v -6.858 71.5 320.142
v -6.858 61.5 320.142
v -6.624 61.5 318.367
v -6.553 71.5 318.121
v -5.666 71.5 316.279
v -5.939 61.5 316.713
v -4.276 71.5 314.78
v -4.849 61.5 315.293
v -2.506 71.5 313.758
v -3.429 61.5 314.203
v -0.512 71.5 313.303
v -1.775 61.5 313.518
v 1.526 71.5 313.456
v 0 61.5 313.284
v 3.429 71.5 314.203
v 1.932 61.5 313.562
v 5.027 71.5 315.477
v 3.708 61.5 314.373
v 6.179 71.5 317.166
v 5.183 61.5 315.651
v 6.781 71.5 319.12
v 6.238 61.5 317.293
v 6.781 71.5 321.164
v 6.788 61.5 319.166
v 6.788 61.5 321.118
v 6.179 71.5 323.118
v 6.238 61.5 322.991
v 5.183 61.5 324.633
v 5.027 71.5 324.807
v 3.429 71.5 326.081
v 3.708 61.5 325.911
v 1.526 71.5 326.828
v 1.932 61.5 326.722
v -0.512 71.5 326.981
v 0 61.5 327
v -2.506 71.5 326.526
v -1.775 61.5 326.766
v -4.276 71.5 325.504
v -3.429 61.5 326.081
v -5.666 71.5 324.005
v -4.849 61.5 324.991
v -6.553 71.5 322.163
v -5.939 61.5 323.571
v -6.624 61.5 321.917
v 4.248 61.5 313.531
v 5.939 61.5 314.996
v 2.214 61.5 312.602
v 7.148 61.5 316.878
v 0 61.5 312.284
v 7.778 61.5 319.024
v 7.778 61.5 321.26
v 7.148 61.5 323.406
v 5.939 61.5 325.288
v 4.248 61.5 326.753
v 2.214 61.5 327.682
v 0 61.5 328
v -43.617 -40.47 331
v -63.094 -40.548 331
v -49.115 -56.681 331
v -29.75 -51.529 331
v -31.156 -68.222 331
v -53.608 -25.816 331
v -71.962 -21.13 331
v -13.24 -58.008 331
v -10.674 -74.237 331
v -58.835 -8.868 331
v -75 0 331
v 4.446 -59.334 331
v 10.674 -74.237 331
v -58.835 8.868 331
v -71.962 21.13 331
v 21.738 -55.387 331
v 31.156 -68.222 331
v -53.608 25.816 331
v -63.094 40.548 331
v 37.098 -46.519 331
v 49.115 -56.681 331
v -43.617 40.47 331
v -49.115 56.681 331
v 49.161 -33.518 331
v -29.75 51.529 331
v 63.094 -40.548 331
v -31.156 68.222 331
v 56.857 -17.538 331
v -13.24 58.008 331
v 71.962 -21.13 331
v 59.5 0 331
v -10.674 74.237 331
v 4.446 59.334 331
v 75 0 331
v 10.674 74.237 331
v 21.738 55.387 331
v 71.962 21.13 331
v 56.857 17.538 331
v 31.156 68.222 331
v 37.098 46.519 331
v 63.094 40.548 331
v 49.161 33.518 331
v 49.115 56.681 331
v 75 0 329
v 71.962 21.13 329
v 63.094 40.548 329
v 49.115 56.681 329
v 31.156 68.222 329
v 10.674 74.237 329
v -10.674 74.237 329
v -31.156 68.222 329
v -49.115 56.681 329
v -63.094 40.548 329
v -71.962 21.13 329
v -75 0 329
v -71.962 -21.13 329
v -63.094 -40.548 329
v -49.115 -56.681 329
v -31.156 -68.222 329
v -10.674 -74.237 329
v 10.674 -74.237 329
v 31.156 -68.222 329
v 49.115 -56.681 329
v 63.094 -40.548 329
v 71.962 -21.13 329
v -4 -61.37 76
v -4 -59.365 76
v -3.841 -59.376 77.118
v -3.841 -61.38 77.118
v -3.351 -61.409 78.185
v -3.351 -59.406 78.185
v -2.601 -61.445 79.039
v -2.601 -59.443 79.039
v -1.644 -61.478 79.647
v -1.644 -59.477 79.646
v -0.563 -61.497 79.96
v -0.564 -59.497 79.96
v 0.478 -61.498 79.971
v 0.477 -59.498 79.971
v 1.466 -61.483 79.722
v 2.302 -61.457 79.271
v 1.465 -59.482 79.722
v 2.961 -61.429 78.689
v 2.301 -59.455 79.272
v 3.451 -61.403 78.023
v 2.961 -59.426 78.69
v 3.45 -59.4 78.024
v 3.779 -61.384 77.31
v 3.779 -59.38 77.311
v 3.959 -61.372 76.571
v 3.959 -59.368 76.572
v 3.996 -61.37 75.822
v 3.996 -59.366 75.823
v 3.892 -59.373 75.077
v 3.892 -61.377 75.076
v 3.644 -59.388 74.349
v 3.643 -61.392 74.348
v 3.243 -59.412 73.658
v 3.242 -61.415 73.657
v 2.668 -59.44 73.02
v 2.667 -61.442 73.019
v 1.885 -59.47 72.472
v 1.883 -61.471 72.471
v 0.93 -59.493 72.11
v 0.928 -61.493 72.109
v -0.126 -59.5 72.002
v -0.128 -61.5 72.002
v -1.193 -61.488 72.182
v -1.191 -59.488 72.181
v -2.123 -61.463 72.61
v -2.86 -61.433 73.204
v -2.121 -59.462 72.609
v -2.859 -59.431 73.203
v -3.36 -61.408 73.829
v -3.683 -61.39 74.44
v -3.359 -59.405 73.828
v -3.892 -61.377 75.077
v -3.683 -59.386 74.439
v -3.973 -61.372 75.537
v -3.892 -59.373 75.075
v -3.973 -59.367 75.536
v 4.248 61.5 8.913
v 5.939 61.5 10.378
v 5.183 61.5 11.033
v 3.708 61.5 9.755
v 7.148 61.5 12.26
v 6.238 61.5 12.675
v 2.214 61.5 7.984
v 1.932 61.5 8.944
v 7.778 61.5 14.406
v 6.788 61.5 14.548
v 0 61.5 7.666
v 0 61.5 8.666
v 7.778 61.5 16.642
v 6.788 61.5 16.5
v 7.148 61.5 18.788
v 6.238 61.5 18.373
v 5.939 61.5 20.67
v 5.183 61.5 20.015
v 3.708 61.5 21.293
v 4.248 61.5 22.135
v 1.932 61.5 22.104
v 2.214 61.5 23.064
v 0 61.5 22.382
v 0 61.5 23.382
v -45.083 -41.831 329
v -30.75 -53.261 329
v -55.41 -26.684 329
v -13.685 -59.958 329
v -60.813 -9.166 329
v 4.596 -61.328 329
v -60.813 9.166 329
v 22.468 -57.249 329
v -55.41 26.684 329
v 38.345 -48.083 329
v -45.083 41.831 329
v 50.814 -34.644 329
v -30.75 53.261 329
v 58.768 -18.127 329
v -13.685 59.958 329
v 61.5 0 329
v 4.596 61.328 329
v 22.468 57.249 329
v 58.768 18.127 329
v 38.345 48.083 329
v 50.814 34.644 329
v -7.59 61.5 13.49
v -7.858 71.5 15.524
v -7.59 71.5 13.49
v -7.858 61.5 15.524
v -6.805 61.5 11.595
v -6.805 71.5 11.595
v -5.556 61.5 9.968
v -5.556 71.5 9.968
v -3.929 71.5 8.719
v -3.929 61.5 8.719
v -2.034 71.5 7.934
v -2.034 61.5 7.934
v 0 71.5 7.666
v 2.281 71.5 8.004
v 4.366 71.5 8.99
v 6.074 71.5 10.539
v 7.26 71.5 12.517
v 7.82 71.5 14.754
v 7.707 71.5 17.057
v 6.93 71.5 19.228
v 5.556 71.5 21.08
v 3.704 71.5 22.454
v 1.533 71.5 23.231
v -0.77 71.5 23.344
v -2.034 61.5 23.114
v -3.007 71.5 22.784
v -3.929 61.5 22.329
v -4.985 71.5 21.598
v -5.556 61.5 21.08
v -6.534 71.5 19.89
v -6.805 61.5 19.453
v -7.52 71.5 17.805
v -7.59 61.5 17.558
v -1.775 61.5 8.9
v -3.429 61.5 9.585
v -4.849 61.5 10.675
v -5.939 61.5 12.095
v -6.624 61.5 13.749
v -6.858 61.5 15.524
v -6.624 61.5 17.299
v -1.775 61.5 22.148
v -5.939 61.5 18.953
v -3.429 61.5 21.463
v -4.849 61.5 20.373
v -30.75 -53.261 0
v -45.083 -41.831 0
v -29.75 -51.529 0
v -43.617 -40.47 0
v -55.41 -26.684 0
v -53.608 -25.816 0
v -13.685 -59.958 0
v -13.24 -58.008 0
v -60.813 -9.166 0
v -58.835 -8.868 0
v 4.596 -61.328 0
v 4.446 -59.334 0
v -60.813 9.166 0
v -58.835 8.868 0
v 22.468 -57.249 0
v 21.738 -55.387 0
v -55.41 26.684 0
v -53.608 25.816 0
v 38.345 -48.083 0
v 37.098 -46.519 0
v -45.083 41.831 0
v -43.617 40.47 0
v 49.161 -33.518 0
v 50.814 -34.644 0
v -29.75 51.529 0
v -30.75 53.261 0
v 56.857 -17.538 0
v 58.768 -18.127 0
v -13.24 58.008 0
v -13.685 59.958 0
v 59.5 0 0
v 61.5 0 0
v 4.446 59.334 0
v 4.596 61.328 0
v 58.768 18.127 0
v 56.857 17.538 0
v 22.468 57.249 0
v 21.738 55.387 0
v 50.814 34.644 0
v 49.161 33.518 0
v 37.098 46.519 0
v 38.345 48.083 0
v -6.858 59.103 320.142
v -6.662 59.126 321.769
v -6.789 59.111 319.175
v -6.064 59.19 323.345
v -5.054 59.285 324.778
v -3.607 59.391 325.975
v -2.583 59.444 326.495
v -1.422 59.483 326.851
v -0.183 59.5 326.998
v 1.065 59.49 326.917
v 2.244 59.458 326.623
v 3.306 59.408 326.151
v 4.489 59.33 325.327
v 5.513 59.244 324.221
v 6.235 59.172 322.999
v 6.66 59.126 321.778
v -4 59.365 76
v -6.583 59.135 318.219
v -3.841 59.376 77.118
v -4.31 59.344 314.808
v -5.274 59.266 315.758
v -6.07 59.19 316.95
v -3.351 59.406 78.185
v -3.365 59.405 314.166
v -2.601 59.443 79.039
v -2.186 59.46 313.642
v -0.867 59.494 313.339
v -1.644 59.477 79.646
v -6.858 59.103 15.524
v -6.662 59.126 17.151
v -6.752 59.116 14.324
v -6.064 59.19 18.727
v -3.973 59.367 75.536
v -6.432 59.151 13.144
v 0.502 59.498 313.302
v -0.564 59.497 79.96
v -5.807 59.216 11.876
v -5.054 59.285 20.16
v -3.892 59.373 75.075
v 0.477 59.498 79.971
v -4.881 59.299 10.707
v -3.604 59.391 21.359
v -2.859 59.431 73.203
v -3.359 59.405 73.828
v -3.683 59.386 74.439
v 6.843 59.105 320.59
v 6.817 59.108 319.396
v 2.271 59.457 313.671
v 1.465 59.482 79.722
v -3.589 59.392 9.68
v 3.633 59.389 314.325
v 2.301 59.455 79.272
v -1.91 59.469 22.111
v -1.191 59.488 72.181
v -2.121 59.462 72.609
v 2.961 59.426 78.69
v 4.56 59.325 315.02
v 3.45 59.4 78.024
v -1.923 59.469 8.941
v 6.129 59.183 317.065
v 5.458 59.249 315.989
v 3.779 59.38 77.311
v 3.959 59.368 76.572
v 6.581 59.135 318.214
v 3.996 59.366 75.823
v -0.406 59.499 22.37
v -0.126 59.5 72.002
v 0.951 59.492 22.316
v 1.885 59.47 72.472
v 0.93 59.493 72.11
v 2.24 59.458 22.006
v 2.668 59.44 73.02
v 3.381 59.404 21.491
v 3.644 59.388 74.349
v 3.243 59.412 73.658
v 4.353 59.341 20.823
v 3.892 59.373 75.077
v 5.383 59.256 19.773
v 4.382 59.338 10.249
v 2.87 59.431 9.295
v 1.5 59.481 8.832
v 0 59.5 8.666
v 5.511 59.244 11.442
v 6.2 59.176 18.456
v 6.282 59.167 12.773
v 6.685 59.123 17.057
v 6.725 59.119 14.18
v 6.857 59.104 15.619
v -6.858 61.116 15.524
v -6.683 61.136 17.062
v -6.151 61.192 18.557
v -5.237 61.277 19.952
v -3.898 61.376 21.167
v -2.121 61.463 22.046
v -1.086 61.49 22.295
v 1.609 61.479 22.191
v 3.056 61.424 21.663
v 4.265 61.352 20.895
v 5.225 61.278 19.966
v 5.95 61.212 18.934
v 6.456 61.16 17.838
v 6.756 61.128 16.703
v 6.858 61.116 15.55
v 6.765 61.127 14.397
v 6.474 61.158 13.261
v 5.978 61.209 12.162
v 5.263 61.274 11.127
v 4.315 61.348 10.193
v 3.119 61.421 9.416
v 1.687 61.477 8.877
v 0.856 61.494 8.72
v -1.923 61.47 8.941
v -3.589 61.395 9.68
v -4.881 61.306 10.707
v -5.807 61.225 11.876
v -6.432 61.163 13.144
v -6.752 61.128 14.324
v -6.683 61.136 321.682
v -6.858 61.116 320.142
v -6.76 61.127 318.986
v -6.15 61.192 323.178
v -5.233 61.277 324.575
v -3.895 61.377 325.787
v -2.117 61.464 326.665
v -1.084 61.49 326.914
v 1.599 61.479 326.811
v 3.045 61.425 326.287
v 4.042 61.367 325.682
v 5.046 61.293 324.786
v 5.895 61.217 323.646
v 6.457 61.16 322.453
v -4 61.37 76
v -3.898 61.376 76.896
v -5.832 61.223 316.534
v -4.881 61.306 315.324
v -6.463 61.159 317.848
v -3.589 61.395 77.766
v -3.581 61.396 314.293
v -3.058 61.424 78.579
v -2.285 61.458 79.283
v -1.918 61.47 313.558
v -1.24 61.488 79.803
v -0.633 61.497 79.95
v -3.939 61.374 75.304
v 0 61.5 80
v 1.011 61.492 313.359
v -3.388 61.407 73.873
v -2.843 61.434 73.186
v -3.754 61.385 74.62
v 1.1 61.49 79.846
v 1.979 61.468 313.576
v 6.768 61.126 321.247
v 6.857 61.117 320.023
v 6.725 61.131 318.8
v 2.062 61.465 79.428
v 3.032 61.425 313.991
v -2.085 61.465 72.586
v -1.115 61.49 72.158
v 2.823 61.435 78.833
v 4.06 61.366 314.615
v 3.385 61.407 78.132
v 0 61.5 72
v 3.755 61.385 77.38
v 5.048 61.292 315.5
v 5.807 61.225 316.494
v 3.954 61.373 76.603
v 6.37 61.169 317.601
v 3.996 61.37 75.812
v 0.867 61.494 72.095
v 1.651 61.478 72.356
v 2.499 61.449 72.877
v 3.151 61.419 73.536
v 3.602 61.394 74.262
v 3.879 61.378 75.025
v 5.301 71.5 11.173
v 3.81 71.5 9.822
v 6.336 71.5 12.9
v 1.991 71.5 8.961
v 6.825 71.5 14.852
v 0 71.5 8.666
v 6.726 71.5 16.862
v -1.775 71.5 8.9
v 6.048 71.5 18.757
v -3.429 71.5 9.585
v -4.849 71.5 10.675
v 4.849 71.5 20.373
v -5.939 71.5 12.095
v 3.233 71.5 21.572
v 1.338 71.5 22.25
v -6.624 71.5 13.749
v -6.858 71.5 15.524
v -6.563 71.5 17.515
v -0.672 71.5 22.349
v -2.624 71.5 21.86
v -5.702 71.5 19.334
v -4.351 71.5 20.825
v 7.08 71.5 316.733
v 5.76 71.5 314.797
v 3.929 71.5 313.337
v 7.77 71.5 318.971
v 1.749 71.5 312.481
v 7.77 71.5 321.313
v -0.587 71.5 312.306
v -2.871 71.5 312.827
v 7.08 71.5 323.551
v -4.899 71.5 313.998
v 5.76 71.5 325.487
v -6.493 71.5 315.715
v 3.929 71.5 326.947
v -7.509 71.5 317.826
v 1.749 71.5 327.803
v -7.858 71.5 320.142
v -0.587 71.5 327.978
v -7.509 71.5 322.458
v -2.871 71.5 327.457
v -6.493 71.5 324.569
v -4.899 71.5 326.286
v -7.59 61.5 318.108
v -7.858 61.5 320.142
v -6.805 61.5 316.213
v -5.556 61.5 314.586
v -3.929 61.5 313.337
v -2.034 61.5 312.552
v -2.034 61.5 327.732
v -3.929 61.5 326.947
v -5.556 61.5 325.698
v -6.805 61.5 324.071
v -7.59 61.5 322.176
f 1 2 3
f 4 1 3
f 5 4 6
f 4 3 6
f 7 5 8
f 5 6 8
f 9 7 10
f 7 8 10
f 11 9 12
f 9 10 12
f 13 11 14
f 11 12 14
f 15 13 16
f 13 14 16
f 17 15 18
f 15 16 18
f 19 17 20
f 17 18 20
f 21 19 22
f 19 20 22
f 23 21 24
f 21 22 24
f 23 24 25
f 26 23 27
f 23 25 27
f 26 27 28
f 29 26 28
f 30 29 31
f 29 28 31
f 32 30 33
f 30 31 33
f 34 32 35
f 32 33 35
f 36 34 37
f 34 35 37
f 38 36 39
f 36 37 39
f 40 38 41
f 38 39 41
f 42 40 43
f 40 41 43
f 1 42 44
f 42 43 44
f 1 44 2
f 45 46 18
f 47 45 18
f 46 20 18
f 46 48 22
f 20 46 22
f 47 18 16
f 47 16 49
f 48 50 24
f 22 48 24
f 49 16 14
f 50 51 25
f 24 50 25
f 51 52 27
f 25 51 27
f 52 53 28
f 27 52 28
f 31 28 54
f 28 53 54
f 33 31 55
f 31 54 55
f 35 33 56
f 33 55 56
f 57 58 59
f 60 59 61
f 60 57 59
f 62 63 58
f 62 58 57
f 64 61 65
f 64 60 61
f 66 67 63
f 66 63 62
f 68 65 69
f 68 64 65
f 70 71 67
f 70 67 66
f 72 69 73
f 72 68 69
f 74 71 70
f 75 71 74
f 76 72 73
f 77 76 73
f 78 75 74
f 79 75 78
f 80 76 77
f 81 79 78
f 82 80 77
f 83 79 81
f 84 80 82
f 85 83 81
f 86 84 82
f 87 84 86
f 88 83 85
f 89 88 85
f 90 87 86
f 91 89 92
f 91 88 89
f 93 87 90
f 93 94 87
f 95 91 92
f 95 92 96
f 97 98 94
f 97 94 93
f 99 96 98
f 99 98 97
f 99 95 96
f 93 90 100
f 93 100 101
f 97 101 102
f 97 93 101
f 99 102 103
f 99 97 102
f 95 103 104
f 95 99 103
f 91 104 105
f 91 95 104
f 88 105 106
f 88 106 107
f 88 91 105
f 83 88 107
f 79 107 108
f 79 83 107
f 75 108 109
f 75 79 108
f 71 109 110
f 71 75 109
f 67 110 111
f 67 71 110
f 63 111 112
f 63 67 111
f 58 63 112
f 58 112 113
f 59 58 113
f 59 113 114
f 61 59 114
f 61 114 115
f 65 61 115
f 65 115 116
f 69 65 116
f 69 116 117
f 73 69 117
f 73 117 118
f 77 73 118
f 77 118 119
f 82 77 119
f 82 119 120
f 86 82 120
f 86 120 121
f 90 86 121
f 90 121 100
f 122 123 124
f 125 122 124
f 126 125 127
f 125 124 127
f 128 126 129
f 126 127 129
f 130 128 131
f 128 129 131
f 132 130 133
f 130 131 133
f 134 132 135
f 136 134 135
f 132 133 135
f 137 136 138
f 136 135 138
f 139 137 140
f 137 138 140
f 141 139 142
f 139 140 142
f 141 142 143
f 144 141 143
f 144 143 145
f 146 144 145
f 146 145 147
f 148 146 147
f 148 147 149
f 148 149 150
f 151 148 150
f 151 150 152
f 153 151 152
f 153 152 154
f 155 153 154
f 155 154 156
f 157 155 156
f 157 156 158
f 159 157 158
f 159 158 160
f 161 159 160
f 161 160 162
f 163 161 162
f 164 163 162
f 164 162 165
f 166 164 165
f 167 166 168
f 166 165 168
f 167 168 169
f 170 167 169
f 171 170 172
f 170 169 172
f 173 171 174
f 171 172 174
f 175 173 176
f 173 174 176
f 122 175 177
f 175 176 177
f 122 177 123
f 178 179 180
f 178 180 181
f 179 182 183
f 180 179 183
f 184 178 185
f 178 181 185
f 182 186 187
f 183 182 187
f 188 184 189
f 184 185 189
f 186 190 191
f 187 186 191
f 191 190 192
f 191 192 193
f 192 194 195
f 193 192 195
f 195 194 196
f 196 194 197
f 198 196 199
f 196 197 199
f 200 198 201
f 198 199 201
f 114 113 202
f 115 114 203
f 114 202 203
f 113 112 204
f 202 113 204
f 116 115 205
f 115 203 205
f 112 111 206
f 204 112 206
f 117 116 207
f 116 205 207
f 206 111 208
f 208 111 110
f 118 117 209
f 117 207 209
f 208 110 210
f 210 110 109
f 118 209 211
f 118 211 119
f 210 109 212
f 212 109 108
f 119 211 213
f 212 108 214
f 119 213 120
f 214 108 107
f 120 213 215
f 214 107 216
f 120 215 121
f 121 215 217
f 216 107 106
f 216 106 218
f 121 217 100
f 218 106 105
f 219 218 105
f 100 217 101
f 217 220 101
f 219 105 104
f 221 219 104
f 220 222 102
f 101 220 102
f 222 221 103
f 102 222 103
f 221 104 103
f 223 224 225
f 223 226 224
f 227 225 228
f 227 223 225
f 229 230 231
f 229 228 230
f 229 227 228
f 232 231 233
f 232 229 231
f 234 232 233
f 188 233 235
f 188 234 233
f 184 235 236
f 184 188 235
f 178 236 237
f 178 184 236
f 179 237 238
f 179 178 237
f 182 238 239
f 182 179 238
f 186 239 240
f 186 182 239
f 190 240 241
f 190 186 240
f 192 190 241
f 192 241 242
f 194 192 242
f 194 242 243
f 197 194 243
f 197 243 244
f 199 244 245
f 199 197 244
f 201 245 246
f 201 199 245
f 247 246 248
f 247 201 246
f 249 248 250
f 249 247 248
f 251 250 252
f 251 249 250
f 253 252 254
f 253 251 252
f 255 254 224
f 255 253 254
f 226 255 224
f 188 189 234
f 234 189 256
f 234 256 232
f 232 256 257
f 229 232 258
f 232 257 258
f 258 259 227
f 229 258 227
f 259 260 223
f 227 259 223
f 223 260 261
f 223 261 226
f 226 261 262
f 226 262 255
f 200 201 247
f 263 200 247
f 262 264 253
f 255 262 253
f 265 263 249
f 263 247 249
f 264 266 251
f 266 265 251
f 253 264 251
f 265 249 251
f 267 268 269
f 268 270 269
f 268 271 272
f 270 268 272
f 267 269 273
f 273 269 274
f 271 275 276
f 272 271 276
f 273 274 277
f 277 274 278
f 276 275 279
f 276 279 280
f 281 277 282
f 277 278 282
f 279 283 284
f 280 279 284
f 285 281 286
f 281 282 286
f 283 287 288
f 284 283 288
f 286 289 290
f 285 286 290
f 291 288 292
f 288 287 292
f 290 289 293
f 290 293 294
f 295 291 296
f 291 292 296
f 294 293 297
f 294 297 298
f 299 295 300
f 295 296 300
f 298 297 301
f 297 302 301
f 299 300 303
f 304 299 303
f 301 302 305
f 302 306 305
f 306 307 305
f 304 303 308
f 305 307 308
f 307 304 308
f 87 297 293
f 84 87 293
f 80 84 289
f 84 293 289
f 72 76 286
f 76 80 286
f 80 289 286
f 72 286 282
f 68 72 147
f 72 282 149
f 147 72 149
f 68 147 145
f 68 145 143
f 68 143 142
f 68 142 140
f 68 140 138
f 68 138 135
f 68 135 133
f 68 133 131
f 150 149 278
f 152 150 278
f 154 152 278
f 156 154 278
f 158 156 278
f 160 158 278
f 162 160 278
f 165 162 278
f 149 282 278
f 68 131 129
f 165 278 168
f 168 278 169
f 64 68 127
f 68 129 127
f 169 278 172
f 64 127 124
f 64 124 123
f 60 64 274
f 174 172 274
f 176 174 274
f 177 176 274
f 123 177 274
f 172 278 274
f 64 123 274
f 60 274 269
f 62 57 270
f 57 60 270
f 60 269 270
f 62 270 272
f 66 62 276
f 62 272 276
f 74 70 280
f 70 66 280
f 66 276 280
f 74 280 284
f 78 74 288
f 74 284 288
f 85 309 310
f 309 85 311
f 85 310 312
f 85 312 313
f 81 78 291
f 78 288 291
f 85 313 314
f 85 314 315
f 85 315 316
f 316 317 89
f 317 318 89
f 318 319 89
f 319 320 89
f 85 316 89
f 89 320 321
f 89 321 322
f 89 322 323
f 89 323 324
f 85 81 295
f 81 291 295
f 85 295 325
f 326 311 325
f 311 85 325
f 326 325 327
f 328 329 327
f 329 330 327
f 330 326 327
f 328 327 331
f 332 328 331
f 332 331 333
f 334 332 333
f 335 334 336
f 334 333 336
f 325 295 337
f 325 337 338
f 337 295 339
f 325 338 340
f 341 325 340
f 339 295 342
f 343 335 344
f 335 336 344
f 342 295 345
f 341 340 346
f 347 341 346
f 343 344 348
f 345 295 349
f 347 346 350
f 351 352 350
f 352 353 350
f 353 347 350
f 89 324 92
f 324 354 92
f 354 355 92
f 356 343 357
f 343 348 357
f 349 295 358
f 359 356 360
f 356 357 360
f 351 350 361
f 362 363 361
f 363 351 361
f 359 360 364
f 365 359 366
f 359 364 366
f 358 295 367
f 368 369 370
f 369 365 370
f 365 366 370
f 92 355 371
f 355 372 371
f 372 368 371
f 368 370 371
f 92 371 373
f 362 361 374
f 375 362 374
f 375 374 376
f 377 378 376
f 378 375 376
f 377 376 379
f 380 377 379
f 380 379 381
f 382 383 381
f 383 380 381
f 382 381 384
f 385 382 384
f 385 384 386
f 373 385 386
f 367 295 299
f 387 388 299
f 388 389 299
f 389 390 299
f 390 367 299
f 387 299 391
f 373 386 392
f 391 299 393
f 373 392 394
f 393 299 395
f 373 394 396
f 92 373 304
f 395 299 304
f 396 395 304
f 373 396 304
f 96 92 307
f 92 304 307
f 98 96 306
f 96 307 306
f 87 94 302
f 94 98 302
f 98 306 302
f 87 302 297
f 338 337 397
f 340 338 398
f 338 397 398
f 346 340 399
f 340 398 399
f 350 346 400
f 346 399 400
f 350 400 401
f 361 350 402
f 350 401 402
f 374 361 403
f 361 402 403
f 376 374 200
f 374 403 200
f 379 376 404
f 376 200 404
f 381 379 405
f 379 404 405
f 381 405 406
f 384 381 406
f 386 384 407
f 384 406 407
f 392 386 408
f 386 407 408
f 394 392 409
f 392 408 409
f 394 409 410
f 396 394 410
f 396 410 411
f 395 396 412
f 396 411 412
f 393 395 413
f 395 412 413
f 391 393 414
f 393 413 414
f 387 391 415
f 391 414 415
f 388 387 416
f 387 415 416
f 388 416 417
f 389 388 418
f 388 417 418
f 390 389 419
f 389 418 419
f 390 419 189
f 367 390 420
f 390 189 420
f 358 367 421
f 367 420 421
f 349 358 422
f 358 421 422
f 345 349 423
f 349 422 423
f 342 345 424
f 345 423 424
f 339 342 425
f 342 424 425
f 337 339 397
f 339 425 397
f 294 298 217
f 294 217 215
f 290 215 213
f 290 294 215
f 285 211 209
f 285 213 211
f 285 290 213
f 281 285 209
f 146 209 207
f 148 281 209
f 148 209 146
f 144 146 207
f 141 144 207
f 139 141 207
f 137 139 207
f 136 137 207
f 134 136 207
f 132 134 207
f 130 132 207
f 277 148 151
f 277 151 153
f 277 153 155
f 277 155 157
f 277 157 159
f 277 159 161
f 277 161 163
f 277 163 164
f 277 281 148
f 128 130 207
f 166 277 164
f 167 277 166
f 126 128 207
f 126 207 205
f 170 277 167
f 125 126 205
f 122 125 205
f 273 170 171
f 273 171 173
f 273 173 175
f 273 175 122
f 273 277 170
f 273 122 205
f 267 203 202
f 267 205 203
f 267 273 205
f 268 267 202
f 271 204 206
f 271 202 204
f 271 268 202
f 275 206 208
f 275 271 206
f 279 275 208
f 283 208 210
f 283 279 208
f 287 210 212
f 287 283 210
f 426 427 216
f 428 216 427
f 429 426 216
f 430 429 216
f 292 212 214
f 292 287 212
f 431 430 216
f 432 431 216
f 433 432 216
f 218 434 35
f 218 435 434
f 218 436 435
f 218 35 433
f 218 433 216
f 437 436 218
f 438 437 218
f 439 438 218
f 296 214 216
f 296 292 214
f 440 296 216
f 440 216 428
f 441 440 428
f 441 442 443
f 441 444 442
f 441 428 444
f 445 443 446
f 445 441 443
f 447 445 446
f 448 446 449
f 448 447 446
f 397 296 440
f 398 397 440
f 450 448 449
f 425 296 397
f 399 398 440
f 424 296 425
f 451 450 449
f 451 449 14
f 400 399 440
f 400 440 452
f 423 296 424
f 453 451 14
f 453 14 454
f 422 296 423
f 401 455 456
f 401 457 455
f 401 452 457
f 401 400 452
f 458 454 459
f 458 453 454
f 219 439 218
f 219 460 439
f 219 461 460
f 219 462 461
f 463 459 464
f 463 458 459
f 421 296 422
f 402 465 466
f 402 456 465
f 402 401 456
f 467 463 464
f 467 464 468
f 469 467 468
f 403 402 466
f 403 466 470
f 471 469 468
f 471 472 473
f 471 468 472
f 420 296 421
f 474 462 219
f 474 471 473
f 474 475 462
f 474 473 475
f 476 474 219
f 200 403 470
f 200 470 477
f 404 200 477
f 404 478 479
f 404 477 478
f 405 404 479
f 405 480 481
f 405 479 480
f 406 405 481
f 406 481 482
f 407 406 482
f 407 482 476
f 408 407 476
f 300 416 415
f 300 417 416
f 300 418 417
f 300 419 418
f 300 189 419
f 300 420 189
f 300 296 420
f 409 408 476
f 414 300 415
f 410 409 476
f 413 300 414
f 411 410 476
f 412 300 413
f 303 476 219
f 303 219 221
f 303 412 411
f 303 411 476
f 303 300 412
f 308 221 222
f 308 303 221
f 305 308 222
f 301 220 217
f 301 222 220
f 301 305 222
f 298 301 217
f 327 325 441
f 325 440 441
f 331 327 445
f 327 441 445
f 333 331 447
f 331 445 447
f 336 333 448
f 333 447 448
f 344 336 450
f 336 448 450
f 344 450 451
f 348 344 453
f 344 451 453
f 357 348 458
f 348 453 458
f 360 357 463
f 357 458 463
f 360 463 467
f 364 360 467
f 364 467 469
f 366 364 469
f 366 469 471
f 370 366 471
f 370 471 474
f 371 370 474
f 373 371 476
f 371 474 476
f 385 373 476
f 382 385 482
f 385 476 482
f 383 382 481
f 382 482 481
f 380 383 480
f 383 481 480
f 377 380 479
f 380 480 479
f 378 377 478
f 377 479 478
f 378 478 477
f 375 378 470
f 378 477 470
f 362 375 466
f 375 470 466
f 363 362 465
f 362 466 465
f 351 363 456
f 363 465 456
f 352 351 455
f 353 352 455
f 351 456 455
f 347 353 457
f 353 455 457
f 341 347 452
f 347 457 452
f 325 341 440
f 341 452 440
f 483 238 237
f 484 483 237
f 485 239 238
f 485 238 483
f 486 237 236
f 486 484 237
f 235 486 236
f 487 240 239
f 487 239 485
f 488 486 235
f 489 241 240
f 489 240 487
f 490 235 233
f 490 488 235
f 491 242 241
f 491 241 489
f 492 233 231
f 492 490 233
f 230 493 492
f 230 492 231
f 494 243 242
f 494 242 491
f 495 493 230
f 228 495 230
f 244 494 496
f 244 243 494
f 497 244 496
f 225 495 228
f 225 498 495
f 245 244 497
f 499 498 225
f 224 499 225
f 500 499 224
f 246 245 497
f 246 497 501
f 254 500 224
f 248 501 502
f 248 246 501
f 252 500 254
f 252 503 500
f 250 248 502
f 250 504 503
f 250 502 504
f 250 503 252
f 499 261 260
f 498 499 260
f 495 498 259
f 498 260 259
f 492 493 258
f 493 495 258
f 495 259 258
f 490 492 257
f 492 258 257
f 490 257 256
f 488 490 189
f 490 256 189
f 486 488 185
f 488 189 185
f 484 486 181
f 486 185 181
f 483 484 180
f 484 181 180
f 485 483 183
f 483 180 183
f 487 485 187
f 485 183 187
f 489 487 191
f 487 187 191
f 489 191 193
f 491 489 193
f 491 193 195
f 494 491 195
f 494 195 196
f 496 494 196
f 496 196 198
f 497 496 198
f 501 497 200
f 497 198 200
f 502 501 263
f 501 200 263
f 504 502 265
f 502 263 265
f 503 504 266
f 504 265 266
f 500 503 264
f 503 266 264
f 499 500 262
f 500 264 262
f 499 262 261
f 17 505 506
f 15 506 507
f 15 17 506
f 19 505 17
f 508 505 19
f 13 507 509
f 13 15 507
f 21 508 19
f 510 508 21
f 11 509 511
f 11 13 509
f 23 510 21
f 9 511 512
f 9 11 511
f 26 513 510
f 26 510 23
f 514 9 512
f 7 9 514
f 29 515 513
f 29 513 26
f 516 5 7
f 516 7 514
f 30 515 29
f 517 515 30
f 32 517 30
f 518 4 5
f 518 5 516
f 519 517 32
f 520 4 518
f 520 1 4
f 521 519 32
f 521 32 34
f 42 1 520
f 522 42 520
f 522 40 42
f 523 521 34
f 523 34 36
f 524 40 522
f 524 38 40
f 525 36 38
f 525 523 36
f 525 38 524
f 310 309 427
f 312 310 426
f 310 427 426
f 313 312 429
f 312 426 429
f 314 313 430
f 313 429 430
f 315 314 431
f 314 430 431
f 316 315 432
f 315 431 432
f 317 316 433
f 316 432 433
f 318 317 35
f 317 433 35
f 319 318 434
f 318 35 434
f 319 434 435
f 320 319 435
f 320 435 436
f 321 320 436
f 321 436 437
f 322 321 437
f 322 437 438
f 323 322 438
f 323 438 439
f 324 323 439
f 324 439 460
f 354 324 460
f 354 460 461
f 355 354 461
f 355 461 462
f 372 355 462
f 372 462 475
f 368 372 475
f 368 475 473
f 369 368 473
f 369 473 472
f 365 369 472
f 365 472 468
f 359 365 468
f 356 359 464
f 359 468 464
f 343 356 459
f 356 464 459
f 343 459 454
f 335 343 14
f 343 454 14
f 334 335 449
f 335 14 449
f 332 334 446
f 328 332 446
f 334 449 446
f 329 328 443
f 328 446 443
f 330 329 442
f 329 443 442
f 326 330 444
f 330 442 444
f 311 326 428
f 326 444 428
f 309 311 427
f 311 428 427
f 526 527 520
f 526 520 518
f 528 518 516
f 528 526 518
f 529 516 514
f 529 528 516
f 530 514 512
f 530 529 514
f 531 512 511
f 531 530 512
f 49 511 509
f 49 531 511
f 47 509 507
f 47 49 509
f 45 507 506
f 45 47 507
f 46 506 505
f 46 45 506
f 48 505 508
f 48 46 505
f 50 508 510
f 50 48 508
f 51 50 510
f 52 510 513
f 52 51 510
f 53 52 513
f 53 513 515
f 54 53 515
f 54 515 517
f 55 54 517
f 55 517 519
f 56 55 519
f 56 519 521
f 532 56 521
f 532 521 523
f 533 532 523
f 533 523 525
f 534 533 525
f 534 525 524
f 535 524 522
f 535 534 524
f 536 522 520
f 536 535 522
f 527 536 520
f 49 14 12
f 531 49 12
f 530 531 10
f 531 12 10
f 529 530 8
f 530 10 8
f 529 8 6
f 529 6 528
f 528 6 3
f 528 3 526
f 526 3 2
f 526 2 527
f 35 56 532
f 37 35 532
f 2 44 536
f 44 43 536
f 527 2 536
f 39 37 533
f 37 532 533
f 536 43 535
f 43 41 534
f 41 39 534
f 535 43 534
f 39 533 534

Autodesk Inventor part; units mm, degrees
ref_plane "YZ Plane" through (0, 0, 0) normal (1, 0, 0) x (0, 1, 0)
ref_plane "XY Plane" through (0, 0, 0) normal (0, 0, 1) x (1, 0, 0)
sketch "Sketch1" plane through (0, 0, 0) normal (0, 0, 1) x (1, 0, 0)
  circle A0 centre (0, 0) radius 59.5
  circle A1 centre (0, 0) radius 61.5
  dimension "d0" = 119
  dimension "d1" = 123
extrude "Extrusion1" add sketch "Sketch1" along normal blind 331
ref_plane "Work Plane1" through (0, 61.5, 0) normal (0, 1, 0) x (-1, 0, 0)
sketch "Sketch2" plane through (0, 61.5, 0) normal (0, 1, 0) x (-1, 0, 0)
  line L0 (61.5, 0) -> (-61.5, 0) projected
  line L1 (0, 0) -> (0, 4)
  line L2 (0, 4) -> (0, 8.666)
  circle A0 centre (0, 15.524) radius 6.858
  circle A1 centre (0, 15.524) radius 7.858
  dimension "d6" = 4
  dimension "d7" = 4.666
  dimension "d8" = 13.716
  dimension "d9" = 6.858
  dimension "d33" = 15.716
extrude "Extrusion2" cut sketch "Sketch2" against normal blind 23 contours A0
sketch "Sketch3" plane through (0, 61.5, 0) normal (0, 1, 0) x (-1, 0, 0)
  line L0 (0, 0) -> (0, 331) construction
  line L1 (-59.5, 331) -> (59.5, 331) projected
  line L2 (0, 331) -> (0, 323) construction
  circle A0 centre (0, 320.142) radius 6.858
  circle A1 centre (0, 320.142) radius 7.858
  point P0 (0, 327)
  dimension "d12" = 8
  dimension "d13" = 13.716
  dimension "d14" = 6.858
  dimension "d36" = 15.716
extrude "Extrusion3" cut sketch "Sketch3" against normal blind 3 contours A0
thread "Thread1" size "M14x1.25" class "6H" standard "ANSI Metric M Profile" full length
thread "Thread2" size "M14x1.25" class "6H" standard "ANSI Metric M Profile" full length
sketch "Sketch4" plane through (0, 61.5, 0) normal (0, 1, 0) x (-1, 0, 0)
  point P0 (0, 0)
sketch "Sketch5" plane through (0, 61.5, 0) normal (0, 1, 0) x (-1, 0, 0)
  line L0 (0, 0) -> (0, 76) construction
  circle A0 centre (0, 76) radius 4
  dimension "d21" = 76
  dimension "d22" = 8
extrude "Extrusion4" cut sketch "Sketch5" against normal through all
thread "Thread3" size "M8x1.25" class "6H" standard "ANSI Metric M Profile" full length
thread "Thread4" size "M8x1.25" class "6H" standard "ANSI Metric M Profile" full length
sketch "Sketch6" plane through (0, 0, 331) normal (0, 0, 1) x (1, 0, 0)
  circle A0 centre (0, 0) radius 75
  circle A1 centre (0, 0) radius 61.5
  dimension "d29" = 150
  dimension "d30" = 123
extrude "Extrusion5" add sketch "Sketch6" against normal blind 2
extrude "Extrusion6" add sketch "Sketch2" along normal blind 10
extrude "Extrusion7" add sketch "Sketch3" along normal blind 10
properties part number "stainless steel outer wall" material "Aluminum 6061"
